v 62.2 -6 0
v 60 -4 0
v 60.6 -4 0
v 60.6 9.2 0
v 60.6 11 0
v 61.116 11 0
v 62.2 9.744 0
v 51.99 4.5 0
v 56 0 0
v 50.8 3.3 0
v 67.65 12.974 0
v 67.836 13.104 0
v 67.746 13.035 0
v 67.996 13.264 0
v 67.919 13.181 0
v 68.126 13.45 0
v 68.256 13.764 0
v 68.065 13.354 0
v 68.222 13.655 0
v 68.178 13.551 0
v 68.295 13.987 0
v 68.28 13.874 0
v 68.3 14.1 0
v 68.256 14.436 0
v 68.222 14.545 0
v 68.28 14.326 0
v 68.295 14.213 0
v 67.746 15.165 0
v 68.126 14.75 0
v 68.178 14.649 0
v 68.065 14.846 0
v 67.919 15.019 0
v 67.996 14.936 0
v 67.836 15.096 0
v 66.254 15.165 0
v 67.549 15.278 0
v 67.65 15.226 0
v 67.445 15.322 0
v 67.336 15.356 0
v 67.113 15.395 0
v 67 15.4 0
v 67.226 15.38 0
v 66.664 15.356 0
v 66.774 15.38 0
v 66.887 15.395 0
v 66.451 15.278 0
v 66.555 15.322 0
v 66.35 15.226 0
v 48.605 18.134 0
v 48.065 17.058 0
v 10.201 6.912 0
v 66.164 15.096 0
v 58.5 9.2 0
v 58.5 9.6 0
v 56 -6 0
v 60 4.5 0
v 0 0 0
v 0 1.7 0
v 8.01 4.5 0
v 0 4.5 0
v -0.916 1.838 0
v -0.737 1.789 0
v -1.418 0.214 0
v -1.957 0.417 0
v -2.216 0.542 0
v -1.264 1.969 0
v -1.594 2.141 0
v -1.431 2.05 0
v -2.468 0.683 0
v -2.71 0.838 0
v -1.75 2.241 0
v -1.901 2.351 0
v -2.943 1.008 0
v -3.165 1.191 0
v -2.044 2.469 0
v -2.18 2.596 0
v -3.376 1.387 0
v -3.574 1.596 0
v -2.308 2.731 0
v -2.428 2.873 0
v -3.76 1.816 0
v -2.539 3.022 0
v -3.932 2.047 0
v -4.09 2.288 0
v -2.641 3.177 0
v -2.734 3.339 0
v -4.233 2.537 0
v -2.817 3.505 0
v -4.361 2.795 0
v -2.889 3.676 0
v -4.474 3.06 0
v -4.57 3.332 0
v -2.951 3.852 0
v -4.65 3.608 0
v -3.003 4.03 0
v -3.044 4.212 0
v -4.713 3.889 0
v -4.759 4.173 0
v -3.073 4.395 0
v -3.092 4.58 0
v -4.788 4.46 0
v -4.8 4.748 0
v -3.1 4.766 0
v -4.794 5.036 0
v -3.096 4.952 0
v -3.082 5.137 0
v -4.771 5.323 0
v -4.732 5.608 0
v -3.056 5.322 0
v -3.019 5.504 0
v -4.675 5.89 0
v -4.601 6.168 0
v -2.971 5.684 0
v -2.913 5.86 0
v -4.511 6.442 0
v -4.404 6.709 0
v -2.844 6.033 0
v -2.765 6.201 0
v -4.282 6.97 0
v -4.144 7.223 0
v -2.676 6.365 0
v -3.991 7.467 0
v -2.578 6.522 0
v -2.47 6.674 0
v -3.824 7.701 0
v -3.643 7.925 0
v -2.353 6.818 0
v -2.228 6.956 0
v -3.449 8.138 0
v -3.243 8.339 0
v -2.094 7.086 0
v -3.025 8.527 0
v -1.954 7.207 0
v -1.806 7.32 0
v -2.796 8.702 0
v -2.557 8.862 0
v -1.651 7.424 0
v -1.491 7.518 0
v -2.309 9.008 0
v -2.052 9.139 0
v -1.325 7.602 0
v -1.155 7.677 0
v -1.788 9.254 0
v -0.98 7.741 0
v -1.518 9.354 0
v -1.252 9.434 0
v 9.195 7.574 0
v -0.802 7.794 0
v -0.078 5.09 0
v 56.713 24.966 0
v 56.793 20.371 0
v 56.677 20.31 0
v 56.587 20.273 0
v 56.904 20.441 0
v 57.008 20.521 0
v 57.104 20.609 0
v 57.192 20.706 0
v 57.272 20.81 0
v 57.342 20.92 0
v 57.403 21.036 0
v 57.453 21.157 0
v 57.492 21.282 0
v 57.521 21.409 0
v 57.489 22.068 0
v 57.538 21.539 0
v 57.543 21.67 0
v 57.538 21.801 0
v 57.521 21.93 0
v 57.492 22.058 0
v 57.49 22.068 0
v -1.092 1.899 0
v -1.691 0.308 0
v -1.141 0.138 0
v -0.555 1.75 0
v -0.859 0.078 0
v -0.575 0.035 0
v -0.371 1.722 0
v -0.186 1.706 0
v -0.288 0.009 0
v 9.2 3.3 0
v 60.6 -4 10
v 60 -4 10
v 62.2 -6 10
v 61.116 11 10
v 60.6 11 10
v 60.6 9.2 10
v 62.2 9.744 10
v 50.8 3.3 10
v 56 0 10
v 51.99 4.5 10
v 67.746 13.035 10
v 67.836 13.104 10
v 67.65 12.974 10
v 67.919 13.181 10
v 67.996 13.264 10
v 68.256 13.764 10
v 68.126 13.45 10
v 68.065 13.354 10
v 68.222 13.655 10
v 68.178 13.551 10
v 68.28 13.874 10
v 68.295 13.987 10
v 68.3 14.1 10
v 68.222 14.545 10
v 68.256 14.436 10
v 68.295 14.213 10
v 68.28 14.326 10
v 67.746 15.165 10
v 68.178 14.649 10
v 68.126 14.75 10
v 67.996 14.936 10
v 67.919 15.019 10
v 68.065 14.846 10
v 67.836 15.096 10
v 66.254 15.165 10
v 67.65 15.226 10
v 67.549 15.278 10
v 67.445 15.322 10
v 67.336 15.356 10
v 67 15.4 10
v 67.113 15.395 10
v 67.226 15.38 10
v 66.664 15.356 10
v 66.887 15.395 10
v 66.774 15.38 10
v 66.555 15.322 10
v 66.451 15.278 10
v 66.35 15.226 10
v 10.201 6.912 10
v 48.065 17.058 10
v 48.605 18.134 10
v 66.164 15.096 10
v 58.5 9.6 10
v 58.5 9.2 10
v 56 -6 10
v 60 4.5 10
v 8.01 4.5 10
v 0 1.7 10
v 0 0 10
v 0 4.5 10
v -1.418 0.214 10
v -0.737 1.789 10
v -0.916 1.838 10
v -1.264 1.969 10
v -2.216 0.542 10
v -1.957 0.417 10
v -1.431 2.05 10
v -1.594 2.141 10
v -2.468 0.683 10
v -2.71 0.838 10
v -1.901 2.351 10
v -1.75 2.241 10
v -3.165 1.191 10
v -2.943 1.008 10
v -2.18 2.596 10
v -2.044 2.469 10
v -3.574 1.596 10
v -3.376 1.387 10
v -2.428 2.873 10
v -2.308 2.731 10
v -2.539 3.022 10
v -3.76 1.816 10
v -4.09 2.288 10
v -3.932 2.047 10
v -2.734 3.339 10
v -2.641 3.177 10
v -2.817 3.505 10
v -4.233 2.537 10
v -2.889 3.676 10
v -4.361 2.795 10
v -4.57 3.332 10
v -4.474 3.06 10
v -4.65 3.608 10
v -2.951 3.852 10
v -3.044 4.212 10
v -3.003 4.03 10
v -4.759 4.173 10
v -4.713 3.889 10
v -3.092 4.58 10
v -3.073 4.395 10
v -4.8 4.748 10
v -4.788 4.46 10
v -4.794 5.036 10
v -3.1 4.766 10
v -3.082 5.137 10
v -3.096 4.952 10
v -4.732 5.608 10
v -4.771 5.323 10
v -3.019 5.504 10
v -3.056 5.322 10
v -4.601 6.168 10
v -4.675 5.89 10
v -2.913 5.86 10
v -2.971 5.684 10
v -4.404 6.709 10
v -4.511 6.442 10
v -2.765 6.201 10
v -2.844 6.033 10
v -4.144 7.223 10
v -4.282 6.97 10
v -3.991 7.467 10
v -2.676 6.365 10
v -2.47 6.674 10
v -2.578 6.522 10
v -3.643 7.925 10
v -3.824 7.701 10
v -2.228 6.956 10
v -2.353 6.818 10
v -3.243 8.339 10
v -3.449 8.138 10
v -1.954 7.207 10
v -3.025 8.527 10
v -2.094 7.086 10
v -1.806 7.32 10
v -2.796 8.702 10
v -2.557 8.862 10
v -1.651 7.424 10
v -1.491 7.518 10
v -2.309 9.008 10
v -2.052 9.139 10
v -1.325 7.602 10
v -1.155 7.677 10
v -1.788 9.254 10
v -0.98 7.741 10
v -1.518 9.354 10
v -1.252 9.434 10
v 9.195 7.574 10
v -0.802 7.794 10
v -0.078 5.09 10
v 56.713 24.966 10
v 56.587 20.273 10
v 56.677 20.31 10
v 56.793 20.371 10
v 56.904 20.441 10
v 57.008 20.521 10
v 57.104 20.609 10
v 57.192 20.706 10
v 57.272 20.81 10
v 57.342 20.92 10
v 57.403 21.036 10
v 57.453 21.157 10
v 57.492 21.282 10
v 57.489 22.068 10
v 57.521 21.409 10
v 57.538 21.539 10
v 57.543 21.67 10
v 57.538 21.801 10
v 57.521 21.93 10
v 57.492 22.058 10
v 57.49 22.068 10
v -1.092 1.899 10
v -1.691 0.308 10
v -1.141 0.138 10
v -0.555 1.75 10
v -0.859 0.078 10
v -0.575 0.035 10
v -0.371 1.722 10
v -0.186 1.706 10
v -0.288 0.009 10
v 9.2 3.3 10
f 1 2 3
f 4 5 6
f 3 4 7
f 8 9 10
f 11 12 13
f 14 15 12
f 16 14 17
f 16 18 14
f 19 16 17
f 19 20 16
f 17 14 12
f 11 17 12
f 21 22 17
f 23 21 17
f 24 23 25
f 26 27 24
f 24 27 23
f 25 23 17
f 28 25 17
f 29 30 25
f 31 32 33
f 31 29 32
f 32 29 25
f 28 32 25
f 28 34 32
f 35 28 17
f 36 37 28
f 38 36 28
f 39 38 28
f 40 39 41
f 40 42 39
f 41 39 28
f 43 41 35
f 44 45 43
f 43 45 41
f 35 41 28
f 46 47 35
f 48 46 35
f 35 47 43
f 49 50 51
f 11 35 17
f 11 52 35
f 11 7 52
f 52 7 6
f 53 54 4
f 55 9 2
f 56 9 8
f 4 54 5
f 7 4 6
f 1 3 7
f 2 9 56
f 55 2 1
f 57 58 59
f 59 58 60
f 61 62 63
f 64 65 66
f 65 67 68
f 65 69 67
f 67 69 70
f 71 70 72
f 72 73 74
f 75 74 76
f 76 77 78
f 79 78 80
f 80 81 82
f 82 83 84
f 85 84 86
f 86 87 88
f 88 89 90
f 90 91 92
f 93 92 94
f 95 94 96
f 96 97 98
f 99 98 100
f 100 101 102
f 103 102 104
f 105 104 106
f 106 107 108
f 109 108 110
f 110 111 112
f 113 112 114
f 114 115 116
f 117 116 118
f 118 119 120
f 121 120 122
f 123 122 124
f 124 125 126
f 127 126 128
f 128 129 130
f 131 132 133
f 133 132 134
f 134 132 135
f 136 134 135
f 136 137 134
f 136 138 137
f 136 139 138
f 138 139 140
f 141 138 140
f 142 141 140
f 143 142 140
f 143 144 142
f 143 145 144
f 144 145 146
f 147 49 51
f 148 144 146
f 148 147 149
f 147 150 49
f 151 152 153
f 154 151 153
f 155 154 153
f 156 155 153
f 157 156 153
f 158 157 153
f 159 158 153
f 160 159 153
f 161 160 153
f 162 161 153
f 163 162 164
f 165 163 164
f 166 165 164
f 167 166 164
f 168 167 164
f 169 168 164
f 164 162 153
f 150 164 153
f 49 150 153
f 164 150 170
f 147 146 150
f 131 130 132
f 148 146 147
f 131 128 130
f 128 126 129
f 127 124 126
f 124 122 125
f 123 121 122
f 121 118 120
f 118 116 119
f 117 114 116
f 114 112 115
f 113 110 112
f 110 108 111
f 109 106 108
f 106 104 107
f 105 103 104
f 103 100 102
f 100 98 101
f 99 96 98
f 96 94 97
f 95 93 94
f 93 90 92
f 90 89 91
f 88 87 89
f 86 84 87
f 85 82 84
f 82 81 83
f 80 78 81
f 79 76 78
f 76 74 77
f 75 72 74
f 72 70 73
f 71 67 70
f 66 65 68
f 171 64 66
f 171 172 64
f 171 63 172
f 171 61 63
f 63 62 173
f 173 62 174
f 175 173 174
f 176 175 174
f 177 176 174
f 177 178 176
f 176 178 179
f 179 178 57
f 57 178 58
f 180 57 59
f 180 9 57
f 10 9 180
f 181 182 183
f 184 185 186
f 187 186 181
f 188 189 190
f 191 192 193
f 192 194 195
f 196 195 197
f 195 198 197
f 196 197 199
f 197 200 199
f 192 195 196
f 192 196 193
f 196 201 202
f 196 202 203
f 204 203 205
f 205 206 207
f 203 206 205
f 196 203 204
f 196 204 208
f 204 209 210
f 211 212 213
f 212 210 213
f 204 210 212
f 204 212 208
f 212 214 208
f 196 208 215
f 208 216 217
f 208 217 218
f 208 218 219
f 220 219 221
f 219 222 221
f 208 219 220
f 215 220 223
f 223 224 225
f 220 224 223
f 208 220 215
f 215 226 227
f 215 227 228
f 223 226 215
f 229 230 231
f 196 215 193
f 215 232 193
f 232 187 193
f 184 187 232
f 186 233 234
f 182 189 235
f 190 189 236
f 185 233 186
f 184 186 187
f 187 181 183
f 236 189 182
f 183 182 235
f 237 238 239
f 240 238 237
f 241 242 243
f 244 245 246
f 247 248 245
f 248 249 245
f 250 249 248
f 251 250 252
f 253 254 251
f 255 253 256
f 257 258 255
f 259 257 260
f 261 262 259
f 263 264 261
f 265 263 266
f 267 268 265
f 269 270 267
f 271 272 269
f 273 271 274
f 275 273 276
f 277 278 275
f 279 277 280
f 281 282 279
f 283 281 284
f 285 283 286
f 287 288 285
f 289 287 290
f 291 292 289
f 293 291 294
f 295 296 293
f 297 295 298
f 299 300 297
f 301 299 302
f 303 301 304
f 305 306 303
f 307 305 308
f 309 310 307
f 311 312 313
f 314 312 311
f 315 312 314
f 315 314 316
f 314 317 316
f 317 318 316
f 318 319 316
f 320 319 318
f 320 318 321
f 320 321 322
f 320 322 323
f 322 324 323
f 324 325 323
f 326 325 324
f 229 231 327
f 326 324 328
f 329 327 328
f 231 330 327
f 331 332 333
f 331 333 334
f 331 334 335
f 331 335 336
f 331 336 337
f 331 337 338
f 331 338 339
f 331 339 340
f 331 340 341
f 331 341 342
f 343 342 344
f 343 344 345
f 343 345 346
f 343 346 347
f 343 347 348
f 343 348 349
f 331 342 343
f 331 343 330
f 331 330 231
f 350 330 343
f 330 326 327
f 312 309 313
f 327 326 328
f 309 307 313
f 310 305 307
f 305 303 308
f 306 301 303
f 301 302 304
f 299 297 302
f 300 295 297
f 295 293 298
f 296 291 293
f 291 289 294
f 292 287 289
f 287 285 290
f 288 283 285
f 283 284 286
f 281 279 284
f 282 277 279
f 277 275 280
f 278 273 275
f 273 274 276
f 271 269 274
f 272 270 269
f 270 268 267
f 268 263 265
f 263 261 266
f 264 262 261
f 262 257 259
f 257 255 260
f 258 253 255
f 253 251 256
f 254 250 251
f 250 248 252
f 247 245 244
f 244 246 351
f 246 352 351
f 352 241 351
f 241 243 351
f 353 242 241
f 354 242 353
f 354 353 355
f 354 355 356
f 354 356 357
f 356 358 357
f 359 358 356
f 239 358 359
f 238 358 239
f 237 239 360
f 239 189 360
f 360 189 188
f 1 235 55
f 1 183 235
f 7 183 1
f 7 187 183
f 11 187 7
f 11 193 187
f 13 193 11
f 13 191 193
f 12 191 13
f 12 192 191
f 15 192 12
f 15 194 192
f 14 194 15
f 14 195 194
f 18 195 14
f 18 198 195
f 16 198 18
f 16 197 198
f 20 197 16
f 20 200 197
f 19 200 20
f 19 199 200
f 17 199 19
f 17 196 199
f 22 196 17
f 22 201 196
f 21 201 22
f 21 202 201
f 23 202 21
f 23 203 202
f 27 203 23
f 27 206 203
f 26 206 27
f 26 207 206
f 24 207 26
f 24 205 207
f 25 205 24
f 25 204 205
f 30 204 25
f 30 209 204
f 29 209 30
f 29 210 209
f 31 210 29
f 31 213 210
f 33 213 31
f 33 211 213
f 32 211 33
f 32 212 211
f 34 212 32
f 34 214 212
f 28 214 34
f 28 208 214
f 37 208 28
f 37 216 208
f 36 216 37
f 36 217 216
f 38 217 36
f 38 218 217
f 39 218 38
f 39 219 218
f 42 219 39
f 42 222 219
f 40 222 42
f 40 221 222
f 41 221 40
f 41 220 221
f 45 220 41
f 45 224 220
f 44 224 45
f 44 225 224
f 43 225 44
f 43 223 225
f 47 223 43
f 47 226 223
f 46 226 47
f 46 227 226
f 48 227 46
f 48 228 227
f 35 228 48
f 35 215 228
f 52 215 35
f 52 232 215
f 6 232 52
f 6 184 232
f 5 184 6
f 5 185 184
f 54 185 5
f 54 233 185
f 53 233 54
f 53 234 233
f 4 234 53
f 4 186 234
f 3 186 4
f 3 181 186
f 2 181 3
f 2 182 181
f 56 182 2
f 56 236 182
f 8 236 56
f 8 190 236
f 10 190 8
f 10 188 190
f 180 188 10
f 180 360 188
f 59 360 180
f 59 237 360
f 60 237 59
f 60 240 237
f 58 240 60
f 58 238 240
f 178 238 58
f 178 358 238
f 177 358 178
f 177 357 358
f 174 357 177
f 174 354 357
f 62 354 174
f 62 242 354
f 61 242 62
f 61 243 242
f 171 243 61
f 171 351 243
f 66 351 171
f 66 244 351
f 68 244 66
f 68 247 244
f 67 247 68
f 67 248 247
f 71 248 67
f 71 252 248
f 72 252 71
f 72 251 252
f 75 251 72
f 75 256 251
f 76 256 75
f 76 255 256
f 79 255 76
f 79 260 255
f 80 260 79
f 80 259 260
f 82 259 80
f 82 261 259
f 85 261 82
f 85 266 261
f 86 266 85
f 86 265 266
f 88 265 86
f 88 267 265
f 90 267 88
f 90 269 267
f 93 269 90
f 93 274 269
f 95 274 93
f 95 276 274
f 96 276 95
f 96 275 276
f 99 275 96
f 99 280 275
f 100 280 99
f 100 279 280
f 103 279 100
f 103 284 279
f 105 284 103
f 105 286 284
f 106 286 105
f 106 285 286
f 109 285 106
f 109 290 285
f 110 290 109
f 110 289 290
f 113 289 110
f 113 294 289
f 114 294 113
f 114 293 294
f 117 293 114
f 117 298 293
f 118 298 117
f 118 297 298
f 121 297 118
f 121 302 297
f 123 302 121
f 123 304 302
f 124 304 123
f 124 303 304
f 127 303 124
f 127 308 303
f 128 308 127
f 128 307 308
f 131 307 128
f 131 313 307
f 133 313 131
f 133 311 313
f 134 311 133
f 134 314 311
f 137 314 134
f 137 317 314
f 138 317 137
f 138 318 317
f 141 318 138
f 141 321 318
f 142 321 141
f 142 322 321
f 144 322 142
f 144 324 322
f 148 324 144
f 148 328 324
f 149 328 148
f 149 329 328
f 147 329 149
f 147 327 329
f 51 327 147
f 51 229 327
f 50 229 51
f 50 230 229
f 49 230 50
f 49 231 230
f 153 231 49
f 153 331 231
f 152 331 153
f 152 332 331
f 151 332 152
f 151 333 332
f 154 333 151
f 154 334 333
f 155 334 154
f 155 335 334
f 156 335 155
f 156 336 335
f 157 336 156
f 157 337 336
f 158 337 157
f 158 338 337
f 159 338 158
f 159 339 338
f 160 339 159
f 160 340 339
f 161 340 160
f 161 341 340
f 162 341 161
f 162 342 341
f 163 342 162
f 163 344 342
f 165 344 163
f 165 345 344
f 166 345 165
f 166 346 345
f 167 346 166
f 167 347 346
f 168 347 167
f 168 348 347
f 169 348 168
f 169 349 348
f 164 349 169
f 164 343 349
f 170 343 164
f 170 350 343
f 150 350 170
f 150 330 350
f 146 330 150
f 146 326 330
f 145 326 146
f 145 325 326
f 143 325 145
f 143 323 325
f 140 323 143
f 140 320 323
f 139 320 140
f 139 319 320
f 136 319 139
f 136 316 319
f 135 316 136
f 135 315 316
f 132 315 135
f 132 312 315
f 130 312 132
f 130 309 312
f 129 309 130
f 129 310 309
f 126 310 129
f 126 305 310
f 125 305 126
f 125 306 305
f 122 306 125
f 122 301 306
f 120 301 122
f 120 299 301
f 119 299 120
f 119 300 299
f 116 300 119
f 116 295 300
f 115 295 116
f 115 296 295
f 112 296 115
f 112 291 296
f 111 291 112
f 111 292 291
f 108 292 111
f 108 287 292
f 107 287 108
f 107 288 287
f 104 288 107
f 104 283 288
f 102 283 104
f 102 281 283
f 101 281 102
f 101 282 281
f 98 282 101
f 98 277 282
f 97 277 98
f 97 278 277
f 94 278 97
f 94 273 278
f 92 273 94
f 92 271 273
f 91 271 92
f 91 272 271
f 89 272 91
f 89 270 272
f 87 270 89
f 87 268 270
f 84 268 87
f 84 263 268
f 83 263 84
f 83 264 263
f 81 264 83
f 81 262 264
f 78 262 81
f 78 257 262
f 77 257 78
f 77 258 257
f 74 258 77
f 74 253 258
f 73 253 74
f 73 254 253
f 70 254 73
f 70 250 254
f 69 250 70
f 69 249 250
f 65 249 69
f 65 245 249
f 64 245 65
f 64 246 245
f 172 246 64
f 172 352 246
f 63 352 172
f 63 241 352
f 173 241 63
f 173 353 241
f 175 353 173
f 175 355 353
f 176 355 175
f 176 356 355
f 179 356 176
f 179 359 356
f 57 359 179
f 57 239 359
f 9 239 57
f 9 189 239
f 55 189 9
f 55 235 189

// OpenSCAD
// Bread bag clip V2 (2026-11-12): the hinged snap-latch chip clip at 60 mm. Replaces bag_slide_clip (too loose:
// a slide-on U cannot clamp). Fold the bag top flat, close the jaw, press the lip: it snaps and holds with preload.
// Research: print-in-place bag clips mostly fail at the hinge (same break point, even PETG 4 walls) or fuse at
// the hinge -> flex-loop hinge, no pin; printed open so nothing can fuse. Base: chip_clip.scad (idea #21).
// - Printed OPEN (top jaw 15 deg up) so the latch lip never overlaps the jaw; the round
//   flex loop is the hinge (no pin to wear out).
// - Ridge on the top jaw into a groove in the bottom jaw: bag is pinched in a zigzag, won't slide.
// - U-spring snap latch pulls the jaws 0.4 mm past the print gap (preload); flick the thumb tab out to open.
// - Rounded jaw tips (no bag snags), chamfered lip = press-to-close ramp.
// Prints flat (profile in XY, 10 mm tall): layers run along the loop, so the hinge flexes
// across strands, not between layers. PETG.
//   p3d slice chip_clip.stl --walls 4 --infill 40 --keep-orient
$fn = 72;
part = "one";      // "set" (60/90/120 + 90) | "one"
L    = 60;         // jaw length for part="one"
H    = 10;         // clip height (print Z)
T    = 4.5;        // jaw thickness
G    = 0.6;        // jaw gap as printed (closed pose)
pre  = 0.4;        // latch preload
w    = 1.7;        // hinge loop wall
th   = 15;         // print-open angle
ym   = T + G / 2;  // hinge centre height
yt   = 2 * T + G;  // top of top jaw (closed)

module bottom_jaw(L) {
  difference() {
    union() {
      square([L, T]);
      // U-spring latch: stub down, foot, long bar up (17 mm flex length, ~1.3 % strain)
      translate([L - 4, -6]) square([4, 6 + 0.01]);
      translate([L - 4, -6]) square([L + 2.2 - (L - 4), 2]);
      translate([L + 0.6, -6]) square([1.6, yt + 7.4]);
      // lip: 1.5 mm catch over the jaw tip, ramp on top = press to close
      polygon([[L - 1.5, yt - pre], [L + 2.2, yt - pre], [L + 2.2, yt + 1.4],
               [L + 0.6, yt + 1.4], [L - 1.5, yt]]);
      // thumb tab: flick out to open
      hull() {
        translate([L + 1.4, yt + 0.6]) circle(0.8);
        translate([L + 7, yt + 4.5]) circle(1.3);
      }
    }
    // V groove (bag zigzag)
    translate([8, T]) polygon([[0, 0.01], [L - 16, 0.01], [L - 17.2, -1.2], [1.2, -1.2]]);
  }
}

module top_jaw(L) {      // tip stays square on top (latch seat), rounded underneath
  difference() {
    union() {
      translate([0, T + G]) square([L, T]);
      translate([9, T + G]) polygon([[0.6, 0], [L - 18.6, 0], [L - 19.4, -0.9], [1.4, -0.9]]);
    }
    translate([L - 1.5, T + G - 0.01]) difference() { square(1.51); translate([0, 1.5]) circle(1.5); }
  }
}

module arc(r0, r1, a0, a1) {     // annulus sector, a0 -> a1 degrees
  n = 48;
  polygon(concat([for (i = [0:n]) let(a = a0 + (a1 - a0) * i / n) [r1 * cos(a), r1 * sin(a)]],
                 [for (i = [n:-1:0]) let(a = a0 + (a1 - a0) * i / n) [r0 * cos(a), r0 * sin(a)]]));
}

module clip2d(L) {
  translate([0, ym]) {
    arc(ym - w, ym, 90 + th, 270);                                   // flex loop / hang hole
    translate([0, -ym]) bottom_jaw(L);
    rotate(th) translate([0, -ym]) top_jaw(L);
    rotate(th) translate([-0.01, ym - w]) square([1.5, w]);         // loop -> top jaw joint
  }
}

module clip(L) linear_extrude(H) clip2d(L);

if (part == "one") clip(L);
else {
  // longest first; jaws open up, nested with 6 mm gaps
  Ls = [120, 90, 90, 60];
  for (i = [0:len(Ls) - 1]) translate([-60, -85 + i * 44, 0]) clip(Ls[i]);
}
